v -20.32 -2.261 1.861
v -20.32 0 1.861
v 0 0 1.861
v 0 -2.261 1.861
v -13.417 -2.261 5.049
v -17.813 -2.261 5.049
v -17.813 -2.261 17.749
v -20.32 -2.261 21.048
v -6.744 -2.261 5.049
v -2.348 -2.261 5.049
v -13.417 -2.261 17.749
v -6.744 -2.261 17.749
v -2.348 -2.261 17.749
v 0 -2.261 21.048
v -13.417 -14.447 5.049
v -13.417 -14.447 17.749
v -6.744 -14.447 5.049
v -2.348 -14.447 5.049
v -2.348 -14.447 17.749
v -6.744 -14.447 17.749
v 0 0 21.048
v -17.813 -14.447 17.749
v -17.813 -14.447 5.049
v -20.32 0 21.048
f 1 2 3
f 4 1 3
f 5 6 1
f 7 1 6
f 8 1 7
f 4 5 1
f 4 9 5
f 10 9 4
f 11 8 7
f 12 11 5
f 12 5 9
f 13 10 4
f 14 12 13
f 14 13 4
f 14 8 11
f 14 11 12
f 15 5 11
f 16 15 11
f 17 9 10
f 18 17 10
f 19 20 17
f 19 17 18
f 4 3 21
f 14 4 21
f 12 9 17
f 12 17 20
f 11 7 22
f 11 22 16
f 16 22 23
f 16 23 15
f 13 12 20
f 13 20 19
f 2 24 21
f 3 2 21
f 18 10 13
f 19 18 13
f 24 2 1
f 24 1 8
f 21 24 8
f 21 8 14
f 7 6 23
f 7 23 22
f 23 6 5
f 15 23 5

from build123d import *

# Parameters (mm, degrees)
F0_W     = 20.32
F0_H     = 19.186653
F1_DEPTH = 2.26077
F2_W     = 4.396148
F2_H     = 12.7
F3_DEPTH = 12.18664


with BuildPart() as f1:
    # F0 (on Front) → F1 (new body)
    with BuildSketch(Plane.XZ):
        with Locations((-10.16, 11.454718)):
            Rectangle(F0_W, F0_H)
    extrude(amount=F1_DEPTH)

    # F2 (on face) → F3 (join)
    with BuildSketch(Plane.XZ.offset(2.26077)):
        with Locations((-15.614839, 11.398978)):
            Rectangle(F2_W, F2_H)
        with Locations((-4.54603, 11.398978)):
            Rectangle(F2_W, F2_H)
    extrude(amount=F3_DEPTH)


solid = f1.part
